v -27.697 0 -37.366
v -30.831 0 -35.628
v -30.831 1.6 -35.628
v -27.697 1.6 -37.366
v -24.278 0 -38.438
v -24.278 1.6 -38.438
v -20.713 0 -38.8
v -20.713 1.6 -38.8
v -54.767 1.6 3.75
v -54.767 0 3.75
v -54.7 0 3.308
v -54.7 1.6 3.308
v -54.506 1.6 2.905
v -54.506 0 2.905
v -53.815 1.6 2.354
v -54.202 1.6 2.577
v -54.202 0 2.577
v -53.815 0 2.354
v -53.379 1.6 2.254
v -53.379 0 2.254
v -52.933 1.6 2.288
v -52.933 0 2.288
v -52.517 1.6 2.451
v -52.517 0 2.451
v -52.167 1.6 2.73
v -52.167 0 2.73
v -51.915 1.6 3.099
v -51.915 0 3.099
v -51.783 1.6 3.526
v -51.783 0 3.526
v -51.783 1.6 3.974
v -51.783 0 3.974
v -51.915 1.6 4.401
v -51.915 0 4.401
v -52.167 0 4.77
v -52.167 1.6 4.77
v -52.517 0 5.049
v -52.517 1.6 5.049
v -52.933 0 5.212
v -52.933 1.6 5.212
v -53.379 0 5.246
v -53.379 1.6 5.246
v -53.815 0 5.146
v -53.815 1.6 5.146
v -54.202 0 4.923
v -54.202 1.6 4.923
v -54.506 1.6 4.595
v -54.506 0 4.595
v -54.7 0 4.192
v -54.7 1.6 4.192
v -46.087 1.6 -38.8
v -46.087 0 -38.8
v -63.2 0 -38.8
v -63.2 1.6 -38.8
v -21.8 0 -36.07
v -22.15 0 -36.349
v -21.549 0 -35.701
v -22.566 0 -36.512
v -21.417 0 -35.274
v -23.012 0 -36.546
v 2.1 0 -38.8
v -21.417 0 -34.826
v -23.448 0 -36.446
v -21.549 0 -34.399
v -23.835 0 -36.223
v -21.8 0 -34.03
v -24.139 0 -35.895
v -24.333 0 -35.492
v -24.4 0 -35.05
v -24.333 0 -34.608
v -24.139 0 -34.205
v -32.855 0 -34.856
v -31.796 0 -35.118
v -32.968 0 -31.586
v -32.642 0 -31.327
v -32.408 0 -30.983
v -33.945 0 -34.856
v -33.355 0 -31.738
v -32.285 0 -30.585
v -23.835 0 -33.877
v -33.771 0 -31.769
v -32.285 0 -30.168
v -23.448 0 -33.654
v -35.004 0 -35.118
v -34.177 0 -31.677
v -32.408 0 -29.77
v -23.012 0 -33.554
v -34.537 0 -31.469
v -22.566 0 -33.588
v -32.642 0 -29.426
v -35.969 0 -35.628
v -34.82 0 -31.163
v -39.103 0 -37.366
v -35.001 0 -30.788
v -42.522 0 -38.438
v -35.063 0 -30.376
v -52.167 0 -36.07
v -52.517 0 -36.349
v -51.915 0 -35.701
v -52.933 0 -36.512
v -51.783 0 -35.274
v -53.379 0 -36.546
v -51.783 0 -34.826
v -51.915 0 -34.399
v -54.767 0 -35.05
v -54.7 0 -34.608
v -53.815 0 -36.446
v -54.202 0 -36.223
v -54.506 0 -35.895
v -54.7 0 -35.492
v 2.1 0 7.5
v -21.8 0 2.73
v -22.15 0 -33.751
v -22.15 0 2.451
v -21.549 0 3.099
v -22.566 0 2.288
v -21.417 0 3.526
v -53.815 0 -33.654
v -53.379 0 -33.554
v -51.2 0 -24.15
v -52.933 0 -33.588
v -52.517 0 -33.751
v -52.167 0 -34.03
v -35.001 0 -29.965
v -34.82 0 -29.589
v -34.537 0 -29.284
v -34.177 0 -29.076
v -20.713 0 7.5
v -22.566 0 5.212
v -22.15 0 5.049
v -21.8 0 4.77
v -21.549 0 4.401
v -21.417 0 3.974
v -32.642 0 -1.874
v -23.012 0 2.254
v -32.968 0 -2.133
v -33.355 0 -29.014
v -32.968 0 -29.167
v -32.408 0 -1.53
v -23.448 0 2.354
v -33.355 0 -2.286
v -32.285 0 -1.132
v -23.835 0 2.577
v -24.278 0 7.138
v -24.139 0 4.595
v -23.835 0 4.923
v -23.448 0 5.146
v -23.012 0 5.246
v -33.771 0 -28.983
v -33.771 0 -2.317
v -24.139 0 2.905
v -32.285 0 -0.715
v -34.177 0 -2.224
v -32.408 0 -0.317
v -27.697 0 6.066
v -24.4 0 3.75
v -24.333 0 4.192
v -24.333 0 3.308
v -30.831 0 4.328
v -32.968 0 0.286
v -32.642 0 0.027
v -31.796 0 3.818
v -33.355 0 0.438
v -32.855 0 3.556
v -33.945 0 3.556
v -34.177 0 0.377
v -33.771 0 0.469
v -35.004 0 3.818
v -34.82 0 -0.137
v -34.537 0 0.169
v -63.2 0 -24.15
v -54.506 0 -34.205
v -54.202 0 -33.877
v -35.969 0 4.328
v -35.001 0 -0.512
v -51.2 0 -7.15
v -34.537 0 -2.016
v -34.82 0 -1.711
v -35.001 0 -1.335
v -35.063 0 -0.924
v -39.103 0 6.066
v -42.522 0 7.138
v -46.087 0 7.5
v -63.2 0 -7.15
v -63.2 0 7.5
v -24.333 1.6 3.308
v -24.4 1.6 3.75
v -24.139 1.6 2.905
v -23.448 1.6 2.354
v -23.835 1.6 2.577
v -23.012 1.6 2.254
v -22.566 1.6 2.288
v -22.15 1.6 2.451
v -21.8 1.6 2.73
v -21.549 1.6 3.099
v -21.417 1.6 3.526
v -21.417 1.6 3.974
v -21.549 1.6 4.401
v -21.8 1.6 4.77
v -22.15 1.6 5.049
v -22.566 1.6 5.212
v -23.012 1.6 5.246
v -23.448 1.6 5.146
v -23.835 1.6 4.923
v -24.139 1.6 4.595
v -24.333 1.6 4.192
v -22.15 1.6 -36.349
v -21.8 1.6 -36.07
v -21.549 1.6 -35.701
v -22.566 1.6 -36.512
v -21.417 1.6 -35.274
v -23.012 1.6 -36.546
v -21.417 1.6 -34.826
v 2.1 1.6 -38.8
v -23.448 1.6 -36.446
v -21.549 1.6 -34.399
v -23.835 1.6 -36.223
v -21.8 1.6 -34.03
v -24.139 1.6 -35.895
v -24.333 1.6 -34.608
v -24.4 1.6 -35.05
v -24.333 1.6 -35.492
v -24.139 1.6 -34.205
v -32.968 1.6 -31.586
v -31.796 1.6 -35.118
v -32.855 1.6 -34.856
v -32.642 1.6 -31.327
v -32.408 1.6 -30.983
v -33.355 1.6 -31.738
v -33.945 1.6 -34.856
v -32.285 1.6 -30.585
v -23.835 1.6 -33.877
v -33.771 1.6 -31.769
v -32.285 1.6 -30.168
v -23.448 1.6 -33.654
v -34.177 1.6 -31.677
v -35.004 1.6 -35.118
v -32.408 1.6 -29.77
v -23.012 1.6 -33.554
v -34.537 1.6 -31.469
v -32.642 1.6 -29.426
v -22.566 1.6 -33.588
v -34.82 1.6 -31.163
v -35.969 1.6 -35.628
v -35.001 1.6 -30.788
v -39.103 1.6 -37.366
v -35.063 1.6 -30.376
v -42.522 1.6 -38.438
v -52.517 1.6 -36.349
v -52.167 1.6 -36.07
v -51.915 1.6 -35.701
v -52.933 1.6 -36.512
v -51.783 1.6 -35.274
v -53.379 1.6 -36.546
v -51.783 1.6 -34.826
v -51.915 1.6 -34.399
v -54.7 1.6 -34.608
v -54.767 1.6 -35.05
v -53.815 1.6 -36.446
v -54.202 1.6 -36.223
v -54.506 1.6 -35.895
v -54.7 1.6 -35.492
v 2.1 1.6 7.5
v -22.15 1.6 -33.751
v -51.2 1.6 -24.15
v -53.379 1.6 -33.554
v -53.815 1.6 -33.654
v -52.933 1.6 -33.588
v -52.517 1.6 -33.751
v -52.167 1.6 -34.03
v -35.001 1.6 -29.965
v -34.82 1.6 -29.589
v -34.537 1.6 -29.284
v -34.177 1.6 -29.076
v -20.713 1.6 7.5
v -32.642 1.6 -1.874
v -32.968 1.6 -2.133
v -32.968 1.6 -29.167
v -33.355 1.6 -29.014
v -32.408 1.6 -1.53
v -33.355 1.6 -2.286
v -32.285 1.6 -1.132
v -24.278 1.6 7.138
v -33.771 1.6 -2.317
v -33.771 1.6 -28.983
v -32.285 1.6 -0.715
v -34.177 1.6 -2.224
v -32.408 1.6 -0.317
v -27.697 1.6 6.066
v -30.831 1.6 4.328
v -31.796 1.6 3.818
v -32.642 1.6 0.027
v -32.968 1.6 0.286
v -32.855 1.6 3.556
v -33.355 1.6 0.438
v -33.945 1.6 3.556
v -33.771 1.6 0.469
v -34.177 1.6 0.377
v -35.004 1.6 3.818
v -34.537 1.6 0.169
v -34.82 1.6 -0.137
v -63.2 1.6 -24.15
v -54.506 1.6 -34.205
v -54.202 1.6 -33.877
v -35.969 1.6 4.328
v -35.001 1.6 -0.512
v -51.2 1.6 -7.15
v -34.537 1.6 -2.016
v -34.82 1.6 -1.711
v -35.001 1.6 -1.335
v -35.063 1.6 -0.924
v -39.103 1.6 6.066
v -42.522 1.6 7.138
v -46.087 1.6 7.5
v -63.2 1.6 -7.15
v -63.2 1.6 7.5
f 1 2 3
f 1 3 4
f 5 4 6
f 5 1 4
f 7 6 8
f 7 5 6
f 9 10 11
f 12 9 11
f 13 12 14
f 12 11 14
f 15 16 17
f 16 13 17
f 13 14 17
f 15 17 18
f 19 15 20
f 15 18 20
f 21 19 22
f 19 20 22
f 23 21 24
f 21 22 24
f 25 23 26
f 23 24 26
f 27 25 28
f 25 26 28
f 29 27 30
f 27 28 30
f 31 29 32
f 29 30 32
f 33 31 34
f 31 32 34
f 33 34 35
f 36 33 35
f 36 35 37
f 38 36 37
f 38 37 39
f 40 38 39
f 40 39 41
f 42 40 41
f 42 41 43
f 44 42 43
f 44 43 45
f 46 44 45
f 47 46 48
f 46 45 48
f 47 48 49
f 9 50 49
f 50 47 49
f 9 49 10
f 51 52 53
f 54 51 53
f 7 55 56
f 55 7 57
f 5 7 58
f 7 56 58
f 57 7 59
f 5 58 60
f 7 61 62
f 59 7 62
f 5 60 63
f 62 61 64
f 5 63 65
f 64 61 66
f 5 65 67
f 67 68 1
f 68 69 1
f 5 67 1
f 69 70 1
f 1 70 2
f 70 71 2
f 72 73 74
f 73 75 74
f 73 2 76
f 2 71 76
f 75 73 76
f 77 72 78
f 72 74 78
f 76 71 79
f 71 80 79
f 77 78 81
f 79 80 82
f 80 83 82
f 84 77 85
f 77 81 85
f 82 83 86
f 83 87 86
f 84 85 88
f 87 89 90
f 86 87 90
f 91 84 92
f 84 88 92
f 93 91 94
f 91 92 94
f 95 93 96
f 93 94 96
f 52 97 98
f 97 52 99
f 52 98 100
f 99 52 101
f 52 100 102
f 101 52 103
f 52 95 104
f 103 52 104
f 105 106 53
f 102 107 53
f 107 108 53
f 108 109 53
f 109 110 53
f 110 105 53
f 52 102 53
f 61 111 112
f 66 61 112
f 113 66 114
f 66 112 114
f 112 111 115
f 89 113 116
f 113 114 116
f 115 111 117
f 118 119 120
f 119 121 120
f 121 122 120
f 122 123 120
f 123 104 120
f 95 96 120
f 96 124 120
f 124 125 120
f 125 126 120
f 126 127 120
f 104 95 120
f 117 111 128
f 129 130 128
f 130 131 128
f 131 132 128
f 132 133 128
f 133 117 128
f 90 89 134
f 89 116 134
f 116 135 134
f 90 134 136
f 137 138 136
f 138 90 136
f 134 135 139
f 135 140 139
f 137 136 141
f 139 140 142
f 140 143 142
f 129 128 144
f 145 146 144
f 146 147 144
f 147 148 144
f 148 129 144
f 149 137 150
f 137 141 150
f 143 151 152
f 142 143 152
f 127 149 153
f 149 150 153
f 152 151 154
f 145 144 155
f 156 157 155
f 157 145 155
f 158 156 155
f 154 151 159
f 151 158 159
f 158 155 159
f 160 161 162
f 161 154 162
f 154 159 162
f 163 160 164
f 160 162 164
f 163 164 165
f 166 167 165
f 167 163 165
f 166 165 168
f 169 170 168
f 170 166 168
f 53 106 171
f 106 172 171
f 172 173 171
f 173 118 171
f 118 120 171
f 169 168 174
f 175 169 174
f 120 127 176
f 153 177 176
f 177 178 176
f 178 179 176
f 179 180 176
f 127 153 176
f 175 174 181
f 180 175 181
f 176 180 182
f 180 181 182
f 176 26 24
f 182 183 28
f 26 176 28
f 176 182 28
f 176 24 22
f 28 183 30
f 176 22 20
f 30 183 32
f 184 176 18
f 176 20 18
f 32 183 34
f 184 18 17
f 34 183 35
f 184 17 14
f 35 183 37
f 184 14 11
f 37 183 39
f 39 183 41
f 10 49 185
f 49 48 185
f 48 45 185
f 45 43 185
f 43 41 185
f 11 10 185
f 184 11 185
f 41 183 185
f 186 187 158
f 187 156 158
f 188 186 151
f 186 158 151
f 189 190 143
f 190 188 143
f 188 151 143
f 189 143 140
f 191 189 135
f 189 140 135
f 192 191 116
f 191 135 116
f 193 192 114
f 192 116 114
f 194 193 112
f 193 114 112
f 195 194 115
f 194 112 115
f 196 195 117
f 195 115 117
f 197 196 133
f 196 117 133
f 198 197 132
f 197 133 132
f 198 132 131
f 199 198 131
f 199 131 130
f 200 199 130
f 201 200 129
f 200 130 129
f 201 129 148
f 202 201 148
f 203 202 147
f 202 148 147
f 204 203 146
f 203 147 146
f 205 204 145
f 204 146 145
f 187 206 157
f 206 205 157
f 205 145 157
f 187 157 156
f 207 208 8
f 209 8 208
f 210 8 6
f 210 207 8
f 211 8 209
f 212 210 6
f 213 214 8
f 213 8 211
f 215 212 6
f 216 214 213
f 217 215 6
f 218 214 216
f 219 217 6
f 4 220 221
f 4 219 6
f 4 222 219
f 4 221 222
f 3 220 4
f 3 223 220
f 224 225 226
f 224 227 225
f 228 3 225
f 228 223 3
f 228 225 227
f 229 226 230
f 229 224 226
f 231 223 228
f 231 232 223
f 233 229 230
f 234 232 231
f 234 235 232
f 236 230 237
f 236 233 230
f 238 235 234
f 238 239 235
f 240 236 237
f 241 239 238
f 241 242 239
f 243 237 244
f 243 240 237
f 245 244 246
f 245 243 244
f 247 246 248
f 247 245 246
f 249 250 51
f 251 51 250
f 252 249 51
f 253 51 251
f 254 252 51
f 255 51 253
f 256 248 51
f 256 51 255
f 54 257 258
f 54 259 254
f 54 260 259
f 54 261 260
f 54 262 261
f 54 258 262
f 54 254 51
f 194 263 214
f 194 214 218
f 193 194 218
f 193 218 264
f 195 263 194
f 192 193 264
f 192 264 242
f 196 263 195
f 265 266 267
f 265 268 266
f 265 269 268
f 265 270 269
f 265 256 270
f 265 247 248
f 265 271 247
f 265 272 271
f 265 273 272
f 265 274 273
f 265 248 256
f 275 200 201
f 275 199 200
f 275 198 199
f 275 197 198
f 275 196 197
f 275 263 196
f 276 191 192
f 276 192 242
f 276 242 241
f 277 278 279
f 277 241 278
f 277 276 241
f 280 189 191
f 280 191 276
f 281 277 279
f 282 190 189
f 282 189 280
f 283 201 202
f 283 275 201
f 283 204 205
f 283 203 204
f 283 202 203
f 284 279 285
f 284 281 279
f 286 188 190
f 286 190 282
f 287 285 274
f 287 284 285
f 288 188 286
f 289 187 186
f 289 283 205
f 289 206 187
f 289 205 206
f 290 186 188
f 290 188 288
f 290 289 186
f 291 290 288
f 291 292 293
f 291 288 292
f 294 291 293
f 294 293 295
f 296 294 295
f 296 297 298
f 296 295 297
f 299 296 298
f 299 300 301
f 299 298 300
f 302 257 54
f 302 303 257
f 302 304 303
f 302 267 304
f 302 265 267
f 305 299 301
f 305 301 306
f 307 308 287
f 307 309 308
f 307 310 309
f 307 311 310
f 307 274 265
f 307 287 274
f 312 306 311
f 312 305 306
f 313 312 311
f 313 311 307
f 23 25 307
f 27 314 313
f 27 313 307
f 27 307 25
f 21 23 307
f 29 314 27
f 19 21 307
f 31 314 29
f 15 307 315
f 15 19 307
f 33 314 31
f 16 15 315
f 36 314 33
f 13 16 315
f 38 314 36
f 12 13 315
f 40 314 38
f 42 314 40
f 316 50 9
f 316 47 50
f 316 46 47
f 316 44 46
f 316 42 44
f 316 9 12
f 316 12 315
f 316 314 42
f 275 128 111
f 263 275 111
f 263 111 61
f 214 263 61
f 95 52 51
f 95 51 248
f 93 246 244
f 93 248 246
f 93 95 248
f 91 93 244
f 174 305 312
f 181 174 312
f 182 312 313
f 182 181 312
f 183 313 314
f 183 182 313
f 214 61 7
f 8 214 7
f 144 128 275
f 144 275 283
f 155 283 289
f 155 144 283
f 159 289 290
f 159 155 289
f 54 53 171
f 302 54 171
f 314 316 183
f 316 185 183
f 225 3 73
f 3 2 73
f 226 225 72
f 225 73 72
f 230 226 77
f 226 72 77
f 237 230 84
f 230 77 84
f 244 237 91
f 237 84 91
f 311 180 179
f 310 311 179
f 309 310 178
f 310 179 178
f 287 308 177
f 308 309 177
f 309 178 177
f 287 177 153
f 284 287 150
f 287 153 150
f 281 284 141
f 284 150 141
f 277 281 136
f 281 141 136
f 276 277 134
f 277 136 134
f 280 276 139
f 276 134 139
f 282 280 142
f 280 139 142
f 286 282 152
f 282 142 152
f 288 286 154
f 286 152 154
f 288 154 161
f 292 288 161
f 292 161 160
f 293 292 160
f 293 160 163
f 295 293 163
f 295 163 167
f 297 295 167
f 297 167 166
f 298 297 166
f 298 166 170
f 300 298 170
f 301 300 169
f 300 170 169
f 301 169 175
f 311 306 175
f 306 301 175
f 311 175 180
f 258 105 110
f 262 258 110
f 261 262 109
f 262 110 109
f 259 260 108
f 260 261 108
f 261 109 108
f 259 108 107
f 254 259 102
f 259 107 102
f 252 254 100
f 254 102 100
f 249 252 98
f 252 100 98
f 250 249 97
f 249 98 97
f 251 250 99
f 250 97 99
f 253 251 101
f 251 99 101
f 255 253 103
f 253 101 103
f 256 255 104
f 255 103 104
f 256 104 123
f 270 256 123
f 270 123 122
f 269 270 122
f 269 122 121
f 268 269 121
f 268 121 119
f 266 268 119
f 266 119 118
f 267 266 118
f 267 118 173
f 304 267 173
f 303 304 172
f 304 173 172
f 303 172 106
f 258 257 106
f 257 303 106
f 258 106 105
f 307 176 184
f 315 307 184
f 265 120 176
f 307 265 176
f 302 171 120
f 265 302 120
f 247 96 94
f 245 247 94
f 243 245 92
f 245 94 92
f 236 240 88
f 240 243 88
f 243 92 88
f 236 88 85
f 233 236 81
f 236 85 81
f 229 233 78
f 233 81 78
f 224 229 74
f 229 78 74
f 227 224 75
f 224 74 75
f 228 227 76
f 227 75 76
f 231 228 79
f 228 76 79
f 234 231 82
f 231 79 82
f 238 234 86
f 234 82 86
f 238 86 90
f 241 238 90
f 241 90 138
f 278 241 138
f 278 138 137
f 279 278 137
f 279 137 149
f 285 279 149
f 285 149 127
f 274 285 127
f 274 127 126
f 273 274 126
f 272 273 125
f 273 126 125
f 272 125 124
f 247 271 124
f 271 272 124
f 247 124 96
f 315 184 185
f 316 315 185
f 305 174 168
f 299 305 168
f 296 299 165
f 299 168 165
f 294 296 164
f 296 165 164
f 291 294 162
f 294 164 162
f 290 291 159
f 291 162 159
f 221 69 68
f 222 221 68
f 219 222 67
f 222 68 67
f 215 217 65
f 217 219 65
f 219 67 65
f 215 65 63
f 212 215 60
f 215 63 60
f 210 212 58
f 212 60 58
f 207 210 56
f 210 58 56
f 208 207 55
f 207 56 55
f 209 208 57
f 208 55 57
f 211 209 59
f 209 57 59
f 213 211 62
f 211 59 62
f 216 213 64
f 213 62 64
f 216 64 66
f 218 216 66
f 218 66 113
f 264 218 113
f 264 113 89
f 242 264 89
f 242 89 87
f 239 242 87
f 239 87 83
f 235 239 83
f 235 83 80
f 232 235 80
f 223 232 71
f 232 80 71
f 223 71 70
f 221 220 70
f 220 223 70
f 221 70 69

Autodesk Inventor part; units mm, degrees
ref_plane "YZ Plane" through (0, 0, 0) normal (1, 0, 0) x (0, 1, 0)
ref_plane "XZ Plane" through (0, 0, 0) normal (0, 1, 0) x (-1, 0, 0)
ref_plane "XY Plane" through (0, 0, 0) normal (0, 0, 1) x (1, 0, 0)
sketch "Эскиз1" plane through (0, 0, 0) normal (0, 1, 0) x (-1, 0, 0)
  circle A0 centre (22.9, 3.75) radius 1.5
  circle A1 centre (53.2667, -35.05) radius 1.5
  circle A2 centre (22.9, -35.05) radius 1.5
  circle A3 centre (33.4, -38.2774) radius 3.3
  circle A4 centre (33.4, 6.9774) radius 3.3
  circle A5 centre (53.2667, 3.75) radius 1.5
  line L0 (63.2, -24.15) -> (51.2, -24.15)
  line L1 (51.2, -24.15) -> (51.2, -7.15)
  line L2 (51.2, -7.15) -> (63.2, -7.15)
  line L3 (63.2, -7.15) -> (63.2, 7.5)
  line L4 (63.2, 7.5) -> (46.0869, 7.5)
  arc A6 (35.969, 10.672) -> (46.0869, 7.5) centre (46.0869, 25.2227) ccw
  arc A7 (35.969, 10.672) -> (30.831, 10.672) centre (33.4, 6.9774) ccw
  arc A8 (20.7131, 7.5) -> (30.831, 10.672) centre (20.7131, 25.2227) ccw
  line L5 (20.7131, 7.5) -> (-2.1, 7.5)
  line L6 (-2.1, 7.5) -> (-2.1, -38.8)
  line L7 (-2.1, -38.8) -> (20.7131, -38.8)
  arc A9 (30.831, -41.972) -> (20.7131, -38.8) centre (20.7131, -56.5227) ccw
  arc A10 (30.831, -41.972) -> (35.969, -41.972) centre (33.4, -38.2774) ccw
  arc A11 (46.0869, -38.8) -> (35.969, -41.972) centre (46.0869, -56.5227) ccw
  line L8 (46.0869, -38.8) -> (63.2, -38.8)
  line L9 (63.2, -38.8) -> (63.2, -24.15)
  circle A12 centre (30.5522, -15.6437) radius 50
  line L10 (53.2667, -35.05) -> (22.9, -35.05)
  line L11 (53.2667, 3.75) -> (22.9, 3.75)
  point P0 (0, 0)
  point P1 (-2.1, -15.65)
  point P2 (0, 0)
  point P3 (-63.2, 38.8)
  point P4 (63.2, -38.8)
  dimension "d7" = 3.75
  dimension "d8" = 3.75
  dimension "d9" = 9.9333
  dimension "d10" = 9.9333
  dimension "d11" = 25
  dimension "d12" = 25
  dimension "d13" = 3
sketch "Эскиз2" plane through (0, 0, 0) normal (0, 1, 0) x (-1, 0, 0)
  line L0 (63.2, 7.5) -> (-2.1, 7.5)
  line L1 (-2.1, 7.5) -> (-2.1, -38.8)
  line L2 (-2.1, -38.8) -> (63.2, -38.8)
  line L3 (63.2, -38.8) -> (63.2, 7.5)
  arc A0 (35.969, 10.672) -> (46.0869, 7.5) centre (46.0869, 25.2227) ccw projected
  arc A1 (35.969, 10.672) -> (30.831, 10.672) centre (33.4, 6.9774) ccw projected
  arc A2 (20.7131, 7.5) -> (30.831, 10.672) centre (20.7131, 25.2227) ccw projected
  arc A3 (46.0869, -38.8) -> (35.969, -41.972) centre (46.0869, -56.5227) ccw projected
  arc A4 (30.831, -41.972) -> (35.969, -41.972) centre (33.4, -38.2774) ccw projected
  arc A5 (30.831, -41.972) -> (20.7131, -38.8) centre (20.7131, -56.5227) ccw projected
  arc A6 (46.0869, 7.5) -> (35.969, 4.328) centre (46.0869, -10.2227) ccw
  arc A7 (30.831, 4.328) -> (35.969, 4.328) centre (33.4, 8.0226) ccw
  arc A8 (30.831, 4.328) -> (20.7131, 7.5) centre (20.7131, -10.2227) ccw
  arc A9 (35.969, -35.628) -> (46.0869, -38.8) centre (46.0869, -21.0773) ccw
  arc A10 (35.969, -35.628) -> (30.831, -35.628) centre (33.4, -39.3226) ccw
  arc A11 (20.7131, -38.8) -> (30.831, -35.628) centre (20.7131, -21.0773) ccw
  circle A12 centre (53.2667, 3.75) radius 1.5 projected
  circle A13 centre (53.2667, -35.05) radius 1.5 projected
  circle A14 centre (22.9, -35.05) radius 1.5 projected
  circle A15 centre (22.9, 3.75) radius 1.5 projected
  line L4 (51.2, -7.15) -> (63.2, -7.15) projected
  line L5 (51.2, -24.15) -> (51.2, -7.15) projected
  line L6 (63.2, -24.15) -> (51.2, -24.15) projected
  line L7 (49.7, 2.1365) -> (49.6974, -33.4365)
  line L8 (5.237, 2.1365) -> (49.7, 2.1365)
  line L9 (49.6974, -33.4365) -> (5.2344, -33.4365)
  line L10 (5.2344, -33.4365) -> (5.237, 2.1365)
  circle A16 centre (33.6662, -30.3764) radius 1.397
  circle A17 centre (33.6662, -0.9236) radius 1.397
  line L11 (49.7, 2.1365) -> (49.7, -33.4365) construction
  line L12 (49.7, -15.65) -> (51.2, -15.65) construction
  arc A18 (-19.4267, 43.6888) -> (-16.3877, 43.6879) centre (-17.9094, 36.2928) ccw
  circle A19 centre (-3.0489, 41.4072) radius 1.397
  circle A20 centre (-32.5129, 41.4072) radius 1.397
  line L13 (-3.0489, 41.4072) -> (-32.5129, 41.4072)
  line L14 (-17.7809, 41.4072) -> (-17.7809, 38)
  line L15 (30.5522, -15.6437) -> (30.5522, -33.4365) construction
  line L16 (33.6662, -30.3764) -> (33.6662, -0.9236) construction
  dimension "d0" = 35.573
  dimension "d1" = 1.5
  dimension "d4" = 3.0601
  dimension "d5" = 3.0601
  dimension "d6" = 3.114
extrude "Выдавливание1" add sketch "Эскиз2" along normal blind 1.6 contours L3 L4 L5 L6 L2 A9 A10 A11 L1 L0 A8 A7 A6 | L7 L9 L10 L8
equation "\"d12\" = d11"
equation "\"d5\" = d4"
properties part number "openMV_board"
